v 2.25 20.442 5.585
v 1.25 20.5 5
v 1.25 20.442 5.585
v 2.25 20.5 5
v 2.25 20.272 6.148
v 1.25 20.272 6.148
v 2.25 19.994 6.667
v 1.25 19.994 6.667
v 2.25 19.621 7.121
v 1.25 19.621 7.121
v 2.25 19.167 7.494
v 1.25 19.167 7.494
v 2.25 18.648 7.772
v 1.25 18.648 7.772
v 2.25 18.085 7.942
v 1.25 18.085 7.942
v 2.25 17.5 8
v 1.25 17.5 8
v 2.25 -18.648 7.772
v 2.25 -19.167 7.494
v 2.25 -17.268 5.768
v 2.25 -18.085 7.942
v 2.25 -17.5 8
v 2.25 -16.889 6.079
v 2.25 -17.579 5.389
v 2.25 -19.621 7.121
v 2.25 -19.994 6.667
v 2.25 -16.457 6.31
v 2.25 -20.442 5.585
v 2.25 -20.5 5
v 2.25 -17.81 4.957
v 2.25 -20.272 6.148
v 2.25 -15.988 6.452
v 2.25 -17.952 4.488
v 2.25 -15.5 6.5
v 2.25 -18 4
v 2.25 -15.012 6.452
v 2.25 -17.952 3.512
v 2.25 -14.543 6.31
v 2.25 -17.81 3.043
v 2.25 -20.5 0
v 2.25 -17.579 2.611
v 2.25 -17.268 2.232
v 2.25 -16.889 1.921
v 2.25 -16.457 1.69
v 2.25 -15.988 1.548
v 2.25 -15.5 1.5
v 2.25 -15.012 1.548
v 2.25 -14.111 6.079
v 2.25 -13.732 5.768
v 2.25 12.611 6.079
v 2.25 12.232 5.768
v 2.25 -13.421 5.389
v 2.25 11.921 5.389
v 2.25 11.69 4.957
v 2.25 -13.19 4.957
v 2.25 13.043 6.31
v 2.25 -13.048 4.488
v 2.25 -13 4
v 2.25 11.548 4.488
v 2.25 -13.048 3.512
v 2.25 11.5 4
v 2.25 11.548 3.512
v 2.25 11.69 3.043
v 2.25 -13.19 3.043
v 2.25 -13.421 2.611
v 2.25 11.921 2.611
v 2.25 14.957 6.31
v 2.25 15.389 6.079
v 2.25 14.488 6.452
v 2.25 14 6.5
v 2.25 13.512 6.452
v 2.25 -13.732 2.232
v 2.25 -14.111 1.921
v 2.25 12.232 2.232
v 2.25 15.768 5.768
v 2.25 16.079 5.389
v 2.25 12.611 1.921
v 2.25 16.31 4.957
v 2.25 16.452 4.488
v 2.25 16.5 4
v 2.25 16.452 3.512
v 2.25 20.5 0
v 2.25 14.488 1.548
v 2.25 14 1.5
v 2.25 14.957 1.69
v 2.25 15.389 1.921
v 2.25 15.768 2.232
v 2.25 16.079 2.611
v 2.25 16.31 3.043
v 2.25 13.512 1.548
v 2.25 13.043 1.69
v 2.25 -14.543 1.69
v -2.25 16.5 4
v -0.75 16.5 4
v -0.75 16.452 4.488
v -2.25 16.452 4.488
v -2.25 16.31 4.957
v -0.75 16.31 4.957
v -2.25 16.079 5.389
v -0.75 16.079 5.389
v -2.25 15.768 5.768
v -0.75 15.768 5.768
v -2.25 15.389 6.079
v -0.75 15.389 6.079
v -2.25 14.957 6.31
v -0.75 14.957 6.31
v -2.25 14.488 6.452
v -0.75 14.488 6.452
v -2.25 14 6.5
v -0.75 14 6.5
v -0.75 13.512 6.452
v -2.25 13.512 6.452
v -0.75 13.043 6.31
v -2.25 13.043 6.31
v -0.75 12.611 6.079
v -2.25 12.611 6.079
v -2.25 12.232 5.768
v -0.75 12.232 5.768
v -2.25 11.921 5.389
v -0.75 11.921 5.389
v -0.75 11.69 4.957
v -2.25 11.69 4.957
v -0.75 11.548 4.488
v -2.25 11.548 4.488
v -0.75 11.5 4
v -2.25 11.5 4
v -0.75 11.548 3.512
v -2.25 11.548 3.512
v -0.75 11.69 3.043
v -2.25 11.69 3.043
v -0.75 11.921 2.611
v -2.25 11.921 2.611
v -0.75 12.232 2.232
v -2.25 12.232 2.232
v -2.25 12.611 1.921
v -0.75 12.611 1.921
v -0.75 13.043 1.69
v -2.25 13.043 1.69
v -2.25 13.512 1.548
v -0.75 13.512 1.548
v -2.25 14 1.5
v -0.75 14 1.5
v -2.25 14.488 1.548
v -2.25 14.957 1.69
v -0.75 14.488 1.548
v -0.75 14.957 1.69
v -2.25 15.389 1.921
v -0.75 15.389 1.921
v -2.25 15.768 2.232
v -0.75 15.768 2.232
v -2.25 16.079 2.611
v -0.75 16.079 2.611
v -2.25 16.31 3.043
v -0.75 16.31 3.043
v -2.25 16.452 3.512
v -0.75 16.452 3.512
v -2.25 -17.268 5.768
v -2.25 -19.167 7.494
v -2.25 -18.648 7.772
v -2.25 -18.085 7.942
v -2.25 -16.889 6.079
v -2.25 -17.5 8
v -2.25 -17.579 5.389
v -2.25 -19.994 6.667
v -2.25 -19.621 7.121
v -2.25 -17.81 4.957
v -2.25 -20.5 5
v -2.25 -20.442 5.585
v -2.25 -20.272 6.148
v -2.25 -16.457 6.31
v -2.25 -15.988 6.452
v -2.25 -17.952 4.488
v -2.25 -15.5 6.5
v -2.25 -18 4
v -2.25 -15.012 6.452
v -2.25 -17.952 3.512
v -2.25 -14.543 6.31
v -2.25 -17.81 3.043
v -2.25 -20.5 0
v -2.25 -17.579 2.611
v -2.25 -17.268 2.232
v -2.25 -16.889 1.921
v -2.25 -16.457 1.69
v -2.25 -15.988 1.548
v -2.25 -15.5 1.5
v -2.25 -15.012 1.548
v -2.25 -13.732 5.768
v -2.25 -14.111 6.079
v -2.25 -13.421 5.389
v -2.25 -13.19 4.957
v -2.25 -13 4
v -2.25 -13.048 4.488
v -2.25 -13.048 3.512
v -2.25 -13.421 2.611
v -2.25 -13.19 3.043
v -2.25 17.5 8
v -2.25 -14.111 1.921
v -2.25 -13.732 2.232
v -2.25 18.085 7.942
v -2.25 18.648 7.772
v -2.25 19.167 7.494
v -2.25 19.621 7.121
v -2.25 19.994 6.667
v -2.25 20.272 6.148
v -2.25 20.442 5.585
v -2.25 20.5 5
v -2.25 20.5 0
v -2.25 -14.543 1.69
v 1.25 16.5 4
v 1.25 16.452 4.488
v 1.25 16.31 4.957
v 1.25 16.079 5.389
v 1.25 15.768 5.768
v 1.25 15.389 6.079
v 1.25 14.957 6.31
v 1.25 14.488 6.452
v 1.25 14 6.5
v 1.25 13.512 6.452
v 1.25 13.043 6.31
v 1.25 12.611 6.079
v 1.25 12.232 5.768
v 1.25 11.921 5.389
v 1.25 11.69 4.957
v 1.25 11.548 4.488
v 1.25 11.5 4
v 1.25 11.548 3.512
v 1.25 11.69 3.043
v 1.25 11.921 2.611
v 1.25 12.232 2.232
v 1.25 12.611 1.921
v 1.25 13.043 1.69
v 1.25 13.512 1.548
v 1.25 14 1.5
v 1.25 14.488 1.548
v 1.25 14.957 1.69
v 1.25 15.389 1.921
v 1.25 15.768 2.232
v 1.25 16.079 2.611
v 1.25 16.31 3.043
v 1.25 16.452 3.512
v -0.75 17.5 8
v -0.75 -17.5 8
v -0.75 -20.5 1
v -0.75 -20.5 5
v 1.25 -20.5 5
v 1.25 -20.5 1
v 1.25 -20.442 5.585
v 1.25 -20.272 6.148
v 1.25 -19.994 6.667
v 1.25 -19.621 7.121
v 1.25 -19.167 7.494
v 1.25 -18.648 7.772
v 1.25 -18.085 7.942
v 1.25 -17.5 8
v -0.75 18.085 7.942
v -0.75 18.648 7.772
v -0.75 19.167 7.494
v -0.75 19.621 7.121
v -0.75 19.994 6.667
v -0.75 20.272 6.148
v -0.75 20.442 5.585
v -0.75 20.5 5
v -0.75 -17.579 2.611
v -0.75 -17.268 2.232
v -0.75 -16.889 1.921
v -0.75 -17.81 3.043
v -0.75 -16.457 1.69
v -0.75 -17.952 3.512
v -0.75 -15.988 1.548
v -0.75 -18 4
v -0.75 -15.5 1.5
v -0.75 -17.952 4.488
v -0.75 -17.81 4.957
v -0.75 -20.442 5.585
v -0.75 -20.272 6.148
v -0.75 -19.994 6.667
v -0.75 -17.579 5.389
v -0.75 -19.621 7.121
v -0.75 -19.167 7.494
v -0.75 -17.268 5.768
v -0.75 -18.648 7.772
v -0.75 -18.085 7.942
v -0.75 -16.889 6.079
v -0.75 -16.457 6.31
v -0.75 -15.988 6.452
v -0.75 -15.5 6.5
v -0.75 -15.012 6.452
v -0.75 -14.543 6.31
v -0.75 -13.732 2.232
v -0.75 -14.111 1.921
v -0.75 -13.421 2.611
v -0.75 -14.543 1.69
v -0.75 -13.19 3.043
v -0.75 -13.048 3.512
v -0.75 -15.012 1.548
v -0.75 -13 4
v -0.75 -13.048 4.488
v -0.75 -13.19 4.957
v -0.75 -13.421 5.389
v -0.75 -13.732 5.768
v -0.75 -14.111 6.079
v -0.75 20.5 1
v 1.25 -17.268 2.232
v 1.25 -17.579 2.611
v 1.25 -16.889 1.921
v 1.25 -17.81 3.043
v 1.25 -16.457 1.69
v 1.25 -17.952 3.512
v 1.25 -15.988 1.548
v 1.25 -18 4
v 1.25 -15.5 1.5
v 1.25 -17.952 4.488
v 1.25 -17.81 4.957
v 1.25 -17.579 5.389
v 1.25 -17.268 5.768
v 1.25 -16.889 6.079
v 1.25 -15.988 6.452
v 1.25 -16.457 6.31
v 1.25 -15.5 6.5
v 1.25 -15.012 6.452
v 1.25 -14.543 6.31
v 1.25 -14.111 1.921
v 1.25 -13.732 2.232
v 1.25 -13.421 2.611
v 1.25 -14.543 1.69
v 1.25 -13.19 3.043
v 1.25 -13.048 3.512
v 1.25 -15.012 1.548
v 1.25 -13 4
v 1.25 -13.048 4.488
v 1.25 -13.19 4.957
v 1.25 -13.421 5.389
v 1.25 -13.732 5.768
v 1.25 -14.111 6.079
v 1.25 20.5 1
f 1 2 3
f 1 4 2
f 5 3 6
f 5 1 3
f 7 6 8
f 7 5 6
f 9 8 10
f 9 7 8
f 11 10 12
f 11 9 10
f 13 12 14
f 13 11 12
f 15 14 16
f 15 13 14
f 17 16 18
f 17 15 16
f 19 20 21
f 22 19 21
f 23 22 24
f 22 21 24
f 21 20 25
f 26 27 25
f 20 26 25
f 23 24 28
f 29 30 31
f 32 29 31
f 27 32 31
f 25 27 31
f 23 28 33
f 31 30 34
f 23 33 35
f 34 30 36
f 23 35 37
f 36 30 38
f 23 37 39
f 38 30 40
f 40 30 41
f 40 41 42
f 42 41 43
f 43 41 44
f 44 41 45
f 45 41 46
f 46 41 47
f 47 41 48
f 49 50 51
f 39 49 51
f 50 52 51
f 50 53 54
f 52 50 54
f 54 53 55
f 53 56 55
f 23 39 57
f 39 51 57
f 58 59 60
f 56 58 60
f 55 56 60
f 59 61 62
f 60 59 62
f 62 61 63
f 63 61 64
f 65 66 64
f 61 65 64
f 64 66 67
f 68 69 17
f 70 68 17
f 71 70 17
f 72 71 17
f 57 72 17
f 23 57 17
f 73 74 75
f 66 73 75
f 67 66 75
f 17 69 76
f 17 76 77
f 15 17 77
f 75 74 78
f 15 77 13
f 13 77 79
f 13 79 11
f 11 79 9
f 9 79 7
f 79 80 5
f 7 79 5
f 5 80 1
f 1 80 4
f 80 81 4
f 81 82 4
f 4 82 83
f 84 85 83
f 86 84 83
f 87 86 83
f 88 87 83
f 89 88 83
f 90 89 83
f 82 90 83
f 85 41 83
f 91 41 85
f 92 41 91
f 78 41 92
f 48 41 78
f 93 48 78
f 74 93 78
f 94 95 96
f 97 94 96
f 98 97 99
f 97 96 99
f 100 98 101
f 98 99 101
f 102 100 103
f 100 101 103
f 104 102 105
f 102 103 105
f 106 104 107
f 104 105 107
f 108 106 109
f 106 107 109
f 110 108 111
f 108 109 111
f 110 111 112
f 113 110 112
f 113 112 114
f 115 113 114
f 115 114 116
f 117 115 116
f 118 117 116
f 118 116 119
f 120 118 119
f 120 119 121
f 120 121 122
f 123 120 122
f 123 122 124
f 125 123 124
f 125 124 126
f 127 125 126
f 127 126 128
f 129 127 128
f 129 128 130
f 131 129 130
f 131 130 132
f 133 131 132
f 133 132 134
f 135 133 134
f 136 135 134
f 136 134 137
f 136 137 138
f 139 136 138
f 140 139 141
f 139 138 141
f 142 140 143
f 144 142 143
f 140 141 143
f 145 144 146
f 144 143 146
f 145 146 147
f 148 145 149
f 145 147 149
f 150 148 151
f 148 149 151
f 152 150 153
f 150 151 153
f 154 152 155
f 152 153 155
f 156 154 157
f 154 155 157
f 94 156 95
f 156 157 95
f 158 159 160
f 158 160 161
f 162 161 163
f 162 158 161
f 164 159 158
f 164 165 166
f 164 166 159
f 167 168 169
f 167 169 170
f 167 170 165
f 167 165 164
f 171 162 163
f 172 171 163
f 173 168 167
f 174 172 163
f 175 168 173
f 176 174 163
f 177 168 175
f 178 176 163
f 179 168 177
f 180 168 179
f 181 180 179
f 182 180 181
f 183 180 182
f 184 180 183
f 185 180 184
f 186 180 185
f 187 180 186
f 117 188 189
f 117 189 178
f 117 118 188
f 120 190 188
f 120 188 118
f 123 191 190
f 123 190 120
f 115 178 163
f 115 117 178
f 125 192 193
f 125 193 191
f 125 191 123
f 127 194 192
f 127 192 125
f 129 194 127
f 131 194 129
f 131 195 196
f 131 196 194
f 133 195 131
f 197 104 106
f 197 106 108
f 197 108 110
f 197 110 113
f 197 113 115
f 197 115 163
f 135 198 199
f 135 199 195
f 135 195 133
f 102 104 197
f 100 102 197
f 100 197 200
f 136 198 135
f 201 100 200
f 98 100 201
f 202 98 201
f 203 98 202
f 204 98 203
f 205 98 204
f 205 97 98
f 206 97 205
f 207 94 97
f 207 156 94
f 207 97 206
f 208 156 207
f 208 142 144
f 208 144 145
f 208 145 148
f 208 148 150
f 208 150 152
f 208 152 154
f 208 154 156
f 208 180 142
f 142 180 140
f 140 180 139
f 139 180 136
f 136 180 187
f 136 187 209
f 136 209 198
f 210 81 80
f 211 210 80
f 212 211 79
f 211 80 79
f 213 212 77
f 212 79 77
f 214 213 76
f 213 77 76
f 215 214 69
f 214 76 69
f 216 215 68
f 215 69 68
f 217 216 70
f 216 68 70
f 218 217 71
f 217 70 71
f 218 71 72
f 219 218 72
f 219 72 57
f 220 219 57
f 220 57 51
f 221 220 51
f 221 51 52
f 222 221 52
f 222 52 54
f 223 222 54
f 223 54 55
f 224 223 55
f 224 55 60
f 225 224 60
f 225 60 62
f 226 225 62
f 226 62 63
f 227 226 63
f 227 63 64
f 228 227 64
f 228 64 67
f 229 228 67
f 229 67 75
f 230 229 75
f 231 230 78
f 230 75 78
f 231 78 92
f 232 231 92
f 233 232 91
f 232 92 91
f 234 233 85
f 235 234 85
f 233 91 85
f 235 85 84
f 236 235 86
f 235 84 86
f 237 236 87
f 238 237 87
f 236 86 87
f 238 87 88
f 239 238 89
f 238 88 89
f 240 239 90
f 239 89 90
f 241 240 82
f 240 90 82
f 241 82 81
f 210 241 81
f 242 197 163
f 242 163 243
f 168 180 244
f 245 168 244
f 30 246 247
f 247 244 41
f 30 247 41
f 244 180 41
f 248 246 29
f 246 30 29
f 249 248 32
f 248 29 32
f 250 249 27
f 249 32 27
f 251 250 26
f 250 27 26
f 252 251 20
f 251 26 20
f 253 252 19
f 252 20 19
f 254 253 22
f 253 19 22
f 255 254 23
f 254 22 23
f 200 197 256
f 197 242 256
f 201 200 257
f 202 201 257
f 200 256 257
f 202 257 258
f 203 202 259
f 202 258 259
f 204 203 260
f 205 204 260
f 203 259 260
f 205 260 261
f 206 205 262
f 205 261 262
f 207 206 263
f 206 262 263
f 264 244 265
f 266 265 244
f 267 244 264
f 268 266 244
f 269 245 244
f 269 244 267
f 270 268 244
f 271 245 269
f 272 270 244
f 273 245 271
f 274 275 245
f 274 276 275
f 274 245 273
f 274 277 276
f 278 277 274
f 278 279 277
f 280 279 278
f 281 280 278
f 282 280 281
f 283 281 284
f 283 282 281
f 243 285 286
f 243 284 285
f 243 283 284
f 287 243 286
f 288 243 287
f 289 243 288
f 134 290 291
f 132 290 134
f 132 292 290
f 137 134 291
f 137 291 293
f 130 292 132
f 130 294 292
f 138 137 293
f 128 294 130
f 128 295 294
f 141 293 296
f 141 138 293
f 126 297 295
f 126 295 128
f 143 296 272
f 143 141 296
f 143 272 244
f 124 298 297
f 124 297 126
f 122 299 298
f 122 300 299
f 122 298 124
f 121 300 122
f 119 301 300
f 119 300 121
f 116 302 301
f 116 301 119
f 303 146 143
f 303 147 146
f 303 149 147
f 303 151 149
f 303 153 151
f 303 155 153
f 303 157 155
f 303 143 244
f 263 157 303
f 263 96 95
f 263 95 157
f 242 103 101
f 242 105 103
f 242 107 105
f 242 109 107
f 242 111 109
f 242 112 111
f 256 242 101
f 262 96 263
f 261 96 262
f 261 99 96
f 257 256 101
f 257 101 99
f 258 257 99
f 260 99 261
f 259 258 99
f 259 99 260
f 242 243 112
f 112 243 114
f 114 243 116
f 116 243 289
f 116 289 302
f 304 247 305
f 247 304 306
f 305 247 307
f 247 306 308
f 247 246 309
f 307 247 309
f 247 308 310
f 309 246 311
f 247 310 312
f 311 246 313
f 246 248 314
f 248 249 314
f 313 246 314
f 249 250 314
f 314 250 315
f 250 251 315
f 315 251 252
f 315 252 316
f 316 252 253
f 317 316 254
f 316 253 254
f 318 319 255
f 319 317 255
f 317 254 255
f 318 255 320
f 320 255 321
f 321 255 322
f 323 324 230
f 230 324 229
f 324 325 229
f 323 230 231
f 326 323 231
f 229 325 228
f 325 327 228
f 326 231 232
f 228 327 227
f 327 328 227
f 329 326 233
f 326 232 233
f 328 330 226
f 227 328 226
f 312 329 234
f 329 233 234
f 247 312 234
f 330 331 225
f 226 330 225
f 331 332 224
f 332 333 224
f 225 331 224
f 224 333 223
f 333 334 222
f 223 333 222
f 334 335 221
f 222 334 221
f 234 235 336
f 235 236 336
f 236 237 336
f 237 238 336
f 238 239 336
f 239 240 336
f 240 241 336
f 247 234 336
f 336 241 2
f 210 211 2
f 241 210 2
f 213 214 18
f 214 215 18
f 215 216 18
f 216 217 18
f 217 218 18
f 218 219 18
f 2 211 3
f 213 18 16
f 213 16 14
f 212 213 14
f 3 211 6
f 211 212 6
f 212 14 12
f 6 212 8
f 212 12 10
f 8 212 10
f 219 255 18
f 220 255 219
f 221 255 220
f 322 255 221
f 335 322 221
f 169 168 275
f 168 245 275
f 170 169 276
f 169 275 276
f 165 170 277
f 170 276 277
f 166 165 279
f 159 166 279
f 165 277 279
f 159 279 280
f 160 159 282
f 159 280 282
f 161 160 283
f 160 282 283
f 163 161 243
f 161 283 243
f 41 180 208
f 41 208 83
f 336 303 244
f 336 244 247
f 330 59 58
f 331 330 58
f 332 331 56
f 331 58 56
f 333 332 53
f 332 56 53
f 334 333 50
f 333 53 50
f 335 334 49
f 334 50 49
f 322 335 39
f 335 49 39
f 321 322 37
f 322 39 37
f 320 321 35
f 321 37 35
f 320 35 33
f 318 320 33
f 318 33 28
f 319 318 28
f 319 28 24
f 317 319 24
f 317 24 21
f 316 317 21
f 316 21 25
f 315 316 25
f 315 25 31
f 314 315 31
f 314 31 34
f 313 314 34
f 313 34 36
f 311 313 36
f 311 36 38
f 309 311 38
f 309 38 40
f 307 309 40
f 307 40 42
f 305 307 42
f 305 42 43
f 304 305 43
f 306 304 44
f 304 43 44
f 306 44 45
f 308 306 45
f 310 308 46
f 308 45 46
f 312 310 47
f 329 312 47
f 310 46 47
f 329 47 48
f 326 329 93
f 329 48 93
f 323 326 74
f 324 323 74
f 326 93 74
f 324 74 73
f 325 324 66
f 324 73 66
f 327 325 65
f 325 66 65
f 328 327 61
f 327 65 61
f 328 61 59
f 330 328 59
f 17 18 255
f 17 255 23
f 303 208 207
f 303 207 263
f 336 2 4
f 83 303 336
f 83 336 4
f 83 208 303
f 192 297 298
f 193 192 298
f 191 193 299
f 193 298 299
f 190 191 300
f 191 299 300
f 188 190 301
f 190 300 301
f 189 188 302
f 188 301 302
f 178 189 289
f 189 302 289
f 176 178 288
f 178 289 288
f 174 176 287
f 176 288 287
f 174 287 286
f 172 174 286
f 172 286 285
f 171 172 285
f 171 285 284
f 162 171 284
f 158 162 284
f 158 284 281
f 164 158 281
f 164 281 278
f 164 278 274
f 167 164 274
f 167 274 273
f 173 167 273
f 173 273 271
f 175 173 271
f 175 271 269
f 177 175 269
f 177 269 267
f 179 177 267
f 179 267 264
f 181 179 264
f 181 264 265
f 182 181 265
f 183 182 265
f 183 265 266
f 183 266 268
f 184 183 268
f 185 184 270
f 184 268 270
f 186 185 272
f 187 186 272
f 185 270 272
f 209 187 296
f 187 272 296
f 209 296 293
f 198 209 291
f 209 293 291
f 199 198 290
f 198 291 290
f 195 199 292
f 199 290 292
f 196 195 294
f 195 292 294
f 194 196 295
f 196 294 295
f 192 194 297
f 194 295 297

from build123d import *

# Parameters (mm, degrees)
SKETCH_1_W          = 4.5
SKETCH_1_H          = 41
EXTRUDE_1_DEPTH     = 8
SKETCH_3_W          = 2
SKETCH_3_H          = 41
CUT_EXTRUDE_1_DEPTH = 7
SKETCH_5_R          = 2.5
CUT_EXTRUDE_2_DEPTH = 23.461077445
FILLET_1_R          = 3


with BuildPart() as part:
    # Эскиз1 → Бобышка-Вытянуть1 (new body)
    with BuildSketch(Plane.XY):
        Rectangle(SKETCH_1_W, SKETCH_1_H)
    extrude(amount=EXTRUDE_1_DEPTH)

    # Эскиз3 → Вырез-Вытянуть1 (cut)
    with BuildSketch(Plane.XY.offset(8)):
        with Locations((0.25, 0)):
            Rectangle(SKETCH_3_W, SKETCH_3_H)
    extrude(amount=-CUT_EXTRUDE_1_DEPTH, mode=Mode.SUBTRACT)

    # Эскиз5 → Вырез-Вытянуть2 (cut, through all)
    with BuildSketch(Plane(origin=(2.25, 0, 0), x_dir=(0, 0, -1), z_dir=(1, 0, 0))):
        with Locations(Location((-4, 14, 0), (0, 0, 90))):
            Circle(SKETCH_5_R)
        with Locations(Location((-4, -15.5, 0), (0, 0, 90))):
            Circle(SKETCH_5_R)
    extrude(amount=-CUT_EXTRUDE_2_DEPTH, mode=Mode.SUBTRACT)

    # Скругление1
    fillet_1_edges = [part.edges().sort_by_distance(p)[0] for p in [
        (-1.5, 20.5, 8),
        (1.75, -20.5, 8),
        (-1.5, -20.5, 8),
        (1.75, 20.5, 8),
    ]]
    fillet(fillet_1_edges, radius=FILLET_1_R)


solid = part.part
